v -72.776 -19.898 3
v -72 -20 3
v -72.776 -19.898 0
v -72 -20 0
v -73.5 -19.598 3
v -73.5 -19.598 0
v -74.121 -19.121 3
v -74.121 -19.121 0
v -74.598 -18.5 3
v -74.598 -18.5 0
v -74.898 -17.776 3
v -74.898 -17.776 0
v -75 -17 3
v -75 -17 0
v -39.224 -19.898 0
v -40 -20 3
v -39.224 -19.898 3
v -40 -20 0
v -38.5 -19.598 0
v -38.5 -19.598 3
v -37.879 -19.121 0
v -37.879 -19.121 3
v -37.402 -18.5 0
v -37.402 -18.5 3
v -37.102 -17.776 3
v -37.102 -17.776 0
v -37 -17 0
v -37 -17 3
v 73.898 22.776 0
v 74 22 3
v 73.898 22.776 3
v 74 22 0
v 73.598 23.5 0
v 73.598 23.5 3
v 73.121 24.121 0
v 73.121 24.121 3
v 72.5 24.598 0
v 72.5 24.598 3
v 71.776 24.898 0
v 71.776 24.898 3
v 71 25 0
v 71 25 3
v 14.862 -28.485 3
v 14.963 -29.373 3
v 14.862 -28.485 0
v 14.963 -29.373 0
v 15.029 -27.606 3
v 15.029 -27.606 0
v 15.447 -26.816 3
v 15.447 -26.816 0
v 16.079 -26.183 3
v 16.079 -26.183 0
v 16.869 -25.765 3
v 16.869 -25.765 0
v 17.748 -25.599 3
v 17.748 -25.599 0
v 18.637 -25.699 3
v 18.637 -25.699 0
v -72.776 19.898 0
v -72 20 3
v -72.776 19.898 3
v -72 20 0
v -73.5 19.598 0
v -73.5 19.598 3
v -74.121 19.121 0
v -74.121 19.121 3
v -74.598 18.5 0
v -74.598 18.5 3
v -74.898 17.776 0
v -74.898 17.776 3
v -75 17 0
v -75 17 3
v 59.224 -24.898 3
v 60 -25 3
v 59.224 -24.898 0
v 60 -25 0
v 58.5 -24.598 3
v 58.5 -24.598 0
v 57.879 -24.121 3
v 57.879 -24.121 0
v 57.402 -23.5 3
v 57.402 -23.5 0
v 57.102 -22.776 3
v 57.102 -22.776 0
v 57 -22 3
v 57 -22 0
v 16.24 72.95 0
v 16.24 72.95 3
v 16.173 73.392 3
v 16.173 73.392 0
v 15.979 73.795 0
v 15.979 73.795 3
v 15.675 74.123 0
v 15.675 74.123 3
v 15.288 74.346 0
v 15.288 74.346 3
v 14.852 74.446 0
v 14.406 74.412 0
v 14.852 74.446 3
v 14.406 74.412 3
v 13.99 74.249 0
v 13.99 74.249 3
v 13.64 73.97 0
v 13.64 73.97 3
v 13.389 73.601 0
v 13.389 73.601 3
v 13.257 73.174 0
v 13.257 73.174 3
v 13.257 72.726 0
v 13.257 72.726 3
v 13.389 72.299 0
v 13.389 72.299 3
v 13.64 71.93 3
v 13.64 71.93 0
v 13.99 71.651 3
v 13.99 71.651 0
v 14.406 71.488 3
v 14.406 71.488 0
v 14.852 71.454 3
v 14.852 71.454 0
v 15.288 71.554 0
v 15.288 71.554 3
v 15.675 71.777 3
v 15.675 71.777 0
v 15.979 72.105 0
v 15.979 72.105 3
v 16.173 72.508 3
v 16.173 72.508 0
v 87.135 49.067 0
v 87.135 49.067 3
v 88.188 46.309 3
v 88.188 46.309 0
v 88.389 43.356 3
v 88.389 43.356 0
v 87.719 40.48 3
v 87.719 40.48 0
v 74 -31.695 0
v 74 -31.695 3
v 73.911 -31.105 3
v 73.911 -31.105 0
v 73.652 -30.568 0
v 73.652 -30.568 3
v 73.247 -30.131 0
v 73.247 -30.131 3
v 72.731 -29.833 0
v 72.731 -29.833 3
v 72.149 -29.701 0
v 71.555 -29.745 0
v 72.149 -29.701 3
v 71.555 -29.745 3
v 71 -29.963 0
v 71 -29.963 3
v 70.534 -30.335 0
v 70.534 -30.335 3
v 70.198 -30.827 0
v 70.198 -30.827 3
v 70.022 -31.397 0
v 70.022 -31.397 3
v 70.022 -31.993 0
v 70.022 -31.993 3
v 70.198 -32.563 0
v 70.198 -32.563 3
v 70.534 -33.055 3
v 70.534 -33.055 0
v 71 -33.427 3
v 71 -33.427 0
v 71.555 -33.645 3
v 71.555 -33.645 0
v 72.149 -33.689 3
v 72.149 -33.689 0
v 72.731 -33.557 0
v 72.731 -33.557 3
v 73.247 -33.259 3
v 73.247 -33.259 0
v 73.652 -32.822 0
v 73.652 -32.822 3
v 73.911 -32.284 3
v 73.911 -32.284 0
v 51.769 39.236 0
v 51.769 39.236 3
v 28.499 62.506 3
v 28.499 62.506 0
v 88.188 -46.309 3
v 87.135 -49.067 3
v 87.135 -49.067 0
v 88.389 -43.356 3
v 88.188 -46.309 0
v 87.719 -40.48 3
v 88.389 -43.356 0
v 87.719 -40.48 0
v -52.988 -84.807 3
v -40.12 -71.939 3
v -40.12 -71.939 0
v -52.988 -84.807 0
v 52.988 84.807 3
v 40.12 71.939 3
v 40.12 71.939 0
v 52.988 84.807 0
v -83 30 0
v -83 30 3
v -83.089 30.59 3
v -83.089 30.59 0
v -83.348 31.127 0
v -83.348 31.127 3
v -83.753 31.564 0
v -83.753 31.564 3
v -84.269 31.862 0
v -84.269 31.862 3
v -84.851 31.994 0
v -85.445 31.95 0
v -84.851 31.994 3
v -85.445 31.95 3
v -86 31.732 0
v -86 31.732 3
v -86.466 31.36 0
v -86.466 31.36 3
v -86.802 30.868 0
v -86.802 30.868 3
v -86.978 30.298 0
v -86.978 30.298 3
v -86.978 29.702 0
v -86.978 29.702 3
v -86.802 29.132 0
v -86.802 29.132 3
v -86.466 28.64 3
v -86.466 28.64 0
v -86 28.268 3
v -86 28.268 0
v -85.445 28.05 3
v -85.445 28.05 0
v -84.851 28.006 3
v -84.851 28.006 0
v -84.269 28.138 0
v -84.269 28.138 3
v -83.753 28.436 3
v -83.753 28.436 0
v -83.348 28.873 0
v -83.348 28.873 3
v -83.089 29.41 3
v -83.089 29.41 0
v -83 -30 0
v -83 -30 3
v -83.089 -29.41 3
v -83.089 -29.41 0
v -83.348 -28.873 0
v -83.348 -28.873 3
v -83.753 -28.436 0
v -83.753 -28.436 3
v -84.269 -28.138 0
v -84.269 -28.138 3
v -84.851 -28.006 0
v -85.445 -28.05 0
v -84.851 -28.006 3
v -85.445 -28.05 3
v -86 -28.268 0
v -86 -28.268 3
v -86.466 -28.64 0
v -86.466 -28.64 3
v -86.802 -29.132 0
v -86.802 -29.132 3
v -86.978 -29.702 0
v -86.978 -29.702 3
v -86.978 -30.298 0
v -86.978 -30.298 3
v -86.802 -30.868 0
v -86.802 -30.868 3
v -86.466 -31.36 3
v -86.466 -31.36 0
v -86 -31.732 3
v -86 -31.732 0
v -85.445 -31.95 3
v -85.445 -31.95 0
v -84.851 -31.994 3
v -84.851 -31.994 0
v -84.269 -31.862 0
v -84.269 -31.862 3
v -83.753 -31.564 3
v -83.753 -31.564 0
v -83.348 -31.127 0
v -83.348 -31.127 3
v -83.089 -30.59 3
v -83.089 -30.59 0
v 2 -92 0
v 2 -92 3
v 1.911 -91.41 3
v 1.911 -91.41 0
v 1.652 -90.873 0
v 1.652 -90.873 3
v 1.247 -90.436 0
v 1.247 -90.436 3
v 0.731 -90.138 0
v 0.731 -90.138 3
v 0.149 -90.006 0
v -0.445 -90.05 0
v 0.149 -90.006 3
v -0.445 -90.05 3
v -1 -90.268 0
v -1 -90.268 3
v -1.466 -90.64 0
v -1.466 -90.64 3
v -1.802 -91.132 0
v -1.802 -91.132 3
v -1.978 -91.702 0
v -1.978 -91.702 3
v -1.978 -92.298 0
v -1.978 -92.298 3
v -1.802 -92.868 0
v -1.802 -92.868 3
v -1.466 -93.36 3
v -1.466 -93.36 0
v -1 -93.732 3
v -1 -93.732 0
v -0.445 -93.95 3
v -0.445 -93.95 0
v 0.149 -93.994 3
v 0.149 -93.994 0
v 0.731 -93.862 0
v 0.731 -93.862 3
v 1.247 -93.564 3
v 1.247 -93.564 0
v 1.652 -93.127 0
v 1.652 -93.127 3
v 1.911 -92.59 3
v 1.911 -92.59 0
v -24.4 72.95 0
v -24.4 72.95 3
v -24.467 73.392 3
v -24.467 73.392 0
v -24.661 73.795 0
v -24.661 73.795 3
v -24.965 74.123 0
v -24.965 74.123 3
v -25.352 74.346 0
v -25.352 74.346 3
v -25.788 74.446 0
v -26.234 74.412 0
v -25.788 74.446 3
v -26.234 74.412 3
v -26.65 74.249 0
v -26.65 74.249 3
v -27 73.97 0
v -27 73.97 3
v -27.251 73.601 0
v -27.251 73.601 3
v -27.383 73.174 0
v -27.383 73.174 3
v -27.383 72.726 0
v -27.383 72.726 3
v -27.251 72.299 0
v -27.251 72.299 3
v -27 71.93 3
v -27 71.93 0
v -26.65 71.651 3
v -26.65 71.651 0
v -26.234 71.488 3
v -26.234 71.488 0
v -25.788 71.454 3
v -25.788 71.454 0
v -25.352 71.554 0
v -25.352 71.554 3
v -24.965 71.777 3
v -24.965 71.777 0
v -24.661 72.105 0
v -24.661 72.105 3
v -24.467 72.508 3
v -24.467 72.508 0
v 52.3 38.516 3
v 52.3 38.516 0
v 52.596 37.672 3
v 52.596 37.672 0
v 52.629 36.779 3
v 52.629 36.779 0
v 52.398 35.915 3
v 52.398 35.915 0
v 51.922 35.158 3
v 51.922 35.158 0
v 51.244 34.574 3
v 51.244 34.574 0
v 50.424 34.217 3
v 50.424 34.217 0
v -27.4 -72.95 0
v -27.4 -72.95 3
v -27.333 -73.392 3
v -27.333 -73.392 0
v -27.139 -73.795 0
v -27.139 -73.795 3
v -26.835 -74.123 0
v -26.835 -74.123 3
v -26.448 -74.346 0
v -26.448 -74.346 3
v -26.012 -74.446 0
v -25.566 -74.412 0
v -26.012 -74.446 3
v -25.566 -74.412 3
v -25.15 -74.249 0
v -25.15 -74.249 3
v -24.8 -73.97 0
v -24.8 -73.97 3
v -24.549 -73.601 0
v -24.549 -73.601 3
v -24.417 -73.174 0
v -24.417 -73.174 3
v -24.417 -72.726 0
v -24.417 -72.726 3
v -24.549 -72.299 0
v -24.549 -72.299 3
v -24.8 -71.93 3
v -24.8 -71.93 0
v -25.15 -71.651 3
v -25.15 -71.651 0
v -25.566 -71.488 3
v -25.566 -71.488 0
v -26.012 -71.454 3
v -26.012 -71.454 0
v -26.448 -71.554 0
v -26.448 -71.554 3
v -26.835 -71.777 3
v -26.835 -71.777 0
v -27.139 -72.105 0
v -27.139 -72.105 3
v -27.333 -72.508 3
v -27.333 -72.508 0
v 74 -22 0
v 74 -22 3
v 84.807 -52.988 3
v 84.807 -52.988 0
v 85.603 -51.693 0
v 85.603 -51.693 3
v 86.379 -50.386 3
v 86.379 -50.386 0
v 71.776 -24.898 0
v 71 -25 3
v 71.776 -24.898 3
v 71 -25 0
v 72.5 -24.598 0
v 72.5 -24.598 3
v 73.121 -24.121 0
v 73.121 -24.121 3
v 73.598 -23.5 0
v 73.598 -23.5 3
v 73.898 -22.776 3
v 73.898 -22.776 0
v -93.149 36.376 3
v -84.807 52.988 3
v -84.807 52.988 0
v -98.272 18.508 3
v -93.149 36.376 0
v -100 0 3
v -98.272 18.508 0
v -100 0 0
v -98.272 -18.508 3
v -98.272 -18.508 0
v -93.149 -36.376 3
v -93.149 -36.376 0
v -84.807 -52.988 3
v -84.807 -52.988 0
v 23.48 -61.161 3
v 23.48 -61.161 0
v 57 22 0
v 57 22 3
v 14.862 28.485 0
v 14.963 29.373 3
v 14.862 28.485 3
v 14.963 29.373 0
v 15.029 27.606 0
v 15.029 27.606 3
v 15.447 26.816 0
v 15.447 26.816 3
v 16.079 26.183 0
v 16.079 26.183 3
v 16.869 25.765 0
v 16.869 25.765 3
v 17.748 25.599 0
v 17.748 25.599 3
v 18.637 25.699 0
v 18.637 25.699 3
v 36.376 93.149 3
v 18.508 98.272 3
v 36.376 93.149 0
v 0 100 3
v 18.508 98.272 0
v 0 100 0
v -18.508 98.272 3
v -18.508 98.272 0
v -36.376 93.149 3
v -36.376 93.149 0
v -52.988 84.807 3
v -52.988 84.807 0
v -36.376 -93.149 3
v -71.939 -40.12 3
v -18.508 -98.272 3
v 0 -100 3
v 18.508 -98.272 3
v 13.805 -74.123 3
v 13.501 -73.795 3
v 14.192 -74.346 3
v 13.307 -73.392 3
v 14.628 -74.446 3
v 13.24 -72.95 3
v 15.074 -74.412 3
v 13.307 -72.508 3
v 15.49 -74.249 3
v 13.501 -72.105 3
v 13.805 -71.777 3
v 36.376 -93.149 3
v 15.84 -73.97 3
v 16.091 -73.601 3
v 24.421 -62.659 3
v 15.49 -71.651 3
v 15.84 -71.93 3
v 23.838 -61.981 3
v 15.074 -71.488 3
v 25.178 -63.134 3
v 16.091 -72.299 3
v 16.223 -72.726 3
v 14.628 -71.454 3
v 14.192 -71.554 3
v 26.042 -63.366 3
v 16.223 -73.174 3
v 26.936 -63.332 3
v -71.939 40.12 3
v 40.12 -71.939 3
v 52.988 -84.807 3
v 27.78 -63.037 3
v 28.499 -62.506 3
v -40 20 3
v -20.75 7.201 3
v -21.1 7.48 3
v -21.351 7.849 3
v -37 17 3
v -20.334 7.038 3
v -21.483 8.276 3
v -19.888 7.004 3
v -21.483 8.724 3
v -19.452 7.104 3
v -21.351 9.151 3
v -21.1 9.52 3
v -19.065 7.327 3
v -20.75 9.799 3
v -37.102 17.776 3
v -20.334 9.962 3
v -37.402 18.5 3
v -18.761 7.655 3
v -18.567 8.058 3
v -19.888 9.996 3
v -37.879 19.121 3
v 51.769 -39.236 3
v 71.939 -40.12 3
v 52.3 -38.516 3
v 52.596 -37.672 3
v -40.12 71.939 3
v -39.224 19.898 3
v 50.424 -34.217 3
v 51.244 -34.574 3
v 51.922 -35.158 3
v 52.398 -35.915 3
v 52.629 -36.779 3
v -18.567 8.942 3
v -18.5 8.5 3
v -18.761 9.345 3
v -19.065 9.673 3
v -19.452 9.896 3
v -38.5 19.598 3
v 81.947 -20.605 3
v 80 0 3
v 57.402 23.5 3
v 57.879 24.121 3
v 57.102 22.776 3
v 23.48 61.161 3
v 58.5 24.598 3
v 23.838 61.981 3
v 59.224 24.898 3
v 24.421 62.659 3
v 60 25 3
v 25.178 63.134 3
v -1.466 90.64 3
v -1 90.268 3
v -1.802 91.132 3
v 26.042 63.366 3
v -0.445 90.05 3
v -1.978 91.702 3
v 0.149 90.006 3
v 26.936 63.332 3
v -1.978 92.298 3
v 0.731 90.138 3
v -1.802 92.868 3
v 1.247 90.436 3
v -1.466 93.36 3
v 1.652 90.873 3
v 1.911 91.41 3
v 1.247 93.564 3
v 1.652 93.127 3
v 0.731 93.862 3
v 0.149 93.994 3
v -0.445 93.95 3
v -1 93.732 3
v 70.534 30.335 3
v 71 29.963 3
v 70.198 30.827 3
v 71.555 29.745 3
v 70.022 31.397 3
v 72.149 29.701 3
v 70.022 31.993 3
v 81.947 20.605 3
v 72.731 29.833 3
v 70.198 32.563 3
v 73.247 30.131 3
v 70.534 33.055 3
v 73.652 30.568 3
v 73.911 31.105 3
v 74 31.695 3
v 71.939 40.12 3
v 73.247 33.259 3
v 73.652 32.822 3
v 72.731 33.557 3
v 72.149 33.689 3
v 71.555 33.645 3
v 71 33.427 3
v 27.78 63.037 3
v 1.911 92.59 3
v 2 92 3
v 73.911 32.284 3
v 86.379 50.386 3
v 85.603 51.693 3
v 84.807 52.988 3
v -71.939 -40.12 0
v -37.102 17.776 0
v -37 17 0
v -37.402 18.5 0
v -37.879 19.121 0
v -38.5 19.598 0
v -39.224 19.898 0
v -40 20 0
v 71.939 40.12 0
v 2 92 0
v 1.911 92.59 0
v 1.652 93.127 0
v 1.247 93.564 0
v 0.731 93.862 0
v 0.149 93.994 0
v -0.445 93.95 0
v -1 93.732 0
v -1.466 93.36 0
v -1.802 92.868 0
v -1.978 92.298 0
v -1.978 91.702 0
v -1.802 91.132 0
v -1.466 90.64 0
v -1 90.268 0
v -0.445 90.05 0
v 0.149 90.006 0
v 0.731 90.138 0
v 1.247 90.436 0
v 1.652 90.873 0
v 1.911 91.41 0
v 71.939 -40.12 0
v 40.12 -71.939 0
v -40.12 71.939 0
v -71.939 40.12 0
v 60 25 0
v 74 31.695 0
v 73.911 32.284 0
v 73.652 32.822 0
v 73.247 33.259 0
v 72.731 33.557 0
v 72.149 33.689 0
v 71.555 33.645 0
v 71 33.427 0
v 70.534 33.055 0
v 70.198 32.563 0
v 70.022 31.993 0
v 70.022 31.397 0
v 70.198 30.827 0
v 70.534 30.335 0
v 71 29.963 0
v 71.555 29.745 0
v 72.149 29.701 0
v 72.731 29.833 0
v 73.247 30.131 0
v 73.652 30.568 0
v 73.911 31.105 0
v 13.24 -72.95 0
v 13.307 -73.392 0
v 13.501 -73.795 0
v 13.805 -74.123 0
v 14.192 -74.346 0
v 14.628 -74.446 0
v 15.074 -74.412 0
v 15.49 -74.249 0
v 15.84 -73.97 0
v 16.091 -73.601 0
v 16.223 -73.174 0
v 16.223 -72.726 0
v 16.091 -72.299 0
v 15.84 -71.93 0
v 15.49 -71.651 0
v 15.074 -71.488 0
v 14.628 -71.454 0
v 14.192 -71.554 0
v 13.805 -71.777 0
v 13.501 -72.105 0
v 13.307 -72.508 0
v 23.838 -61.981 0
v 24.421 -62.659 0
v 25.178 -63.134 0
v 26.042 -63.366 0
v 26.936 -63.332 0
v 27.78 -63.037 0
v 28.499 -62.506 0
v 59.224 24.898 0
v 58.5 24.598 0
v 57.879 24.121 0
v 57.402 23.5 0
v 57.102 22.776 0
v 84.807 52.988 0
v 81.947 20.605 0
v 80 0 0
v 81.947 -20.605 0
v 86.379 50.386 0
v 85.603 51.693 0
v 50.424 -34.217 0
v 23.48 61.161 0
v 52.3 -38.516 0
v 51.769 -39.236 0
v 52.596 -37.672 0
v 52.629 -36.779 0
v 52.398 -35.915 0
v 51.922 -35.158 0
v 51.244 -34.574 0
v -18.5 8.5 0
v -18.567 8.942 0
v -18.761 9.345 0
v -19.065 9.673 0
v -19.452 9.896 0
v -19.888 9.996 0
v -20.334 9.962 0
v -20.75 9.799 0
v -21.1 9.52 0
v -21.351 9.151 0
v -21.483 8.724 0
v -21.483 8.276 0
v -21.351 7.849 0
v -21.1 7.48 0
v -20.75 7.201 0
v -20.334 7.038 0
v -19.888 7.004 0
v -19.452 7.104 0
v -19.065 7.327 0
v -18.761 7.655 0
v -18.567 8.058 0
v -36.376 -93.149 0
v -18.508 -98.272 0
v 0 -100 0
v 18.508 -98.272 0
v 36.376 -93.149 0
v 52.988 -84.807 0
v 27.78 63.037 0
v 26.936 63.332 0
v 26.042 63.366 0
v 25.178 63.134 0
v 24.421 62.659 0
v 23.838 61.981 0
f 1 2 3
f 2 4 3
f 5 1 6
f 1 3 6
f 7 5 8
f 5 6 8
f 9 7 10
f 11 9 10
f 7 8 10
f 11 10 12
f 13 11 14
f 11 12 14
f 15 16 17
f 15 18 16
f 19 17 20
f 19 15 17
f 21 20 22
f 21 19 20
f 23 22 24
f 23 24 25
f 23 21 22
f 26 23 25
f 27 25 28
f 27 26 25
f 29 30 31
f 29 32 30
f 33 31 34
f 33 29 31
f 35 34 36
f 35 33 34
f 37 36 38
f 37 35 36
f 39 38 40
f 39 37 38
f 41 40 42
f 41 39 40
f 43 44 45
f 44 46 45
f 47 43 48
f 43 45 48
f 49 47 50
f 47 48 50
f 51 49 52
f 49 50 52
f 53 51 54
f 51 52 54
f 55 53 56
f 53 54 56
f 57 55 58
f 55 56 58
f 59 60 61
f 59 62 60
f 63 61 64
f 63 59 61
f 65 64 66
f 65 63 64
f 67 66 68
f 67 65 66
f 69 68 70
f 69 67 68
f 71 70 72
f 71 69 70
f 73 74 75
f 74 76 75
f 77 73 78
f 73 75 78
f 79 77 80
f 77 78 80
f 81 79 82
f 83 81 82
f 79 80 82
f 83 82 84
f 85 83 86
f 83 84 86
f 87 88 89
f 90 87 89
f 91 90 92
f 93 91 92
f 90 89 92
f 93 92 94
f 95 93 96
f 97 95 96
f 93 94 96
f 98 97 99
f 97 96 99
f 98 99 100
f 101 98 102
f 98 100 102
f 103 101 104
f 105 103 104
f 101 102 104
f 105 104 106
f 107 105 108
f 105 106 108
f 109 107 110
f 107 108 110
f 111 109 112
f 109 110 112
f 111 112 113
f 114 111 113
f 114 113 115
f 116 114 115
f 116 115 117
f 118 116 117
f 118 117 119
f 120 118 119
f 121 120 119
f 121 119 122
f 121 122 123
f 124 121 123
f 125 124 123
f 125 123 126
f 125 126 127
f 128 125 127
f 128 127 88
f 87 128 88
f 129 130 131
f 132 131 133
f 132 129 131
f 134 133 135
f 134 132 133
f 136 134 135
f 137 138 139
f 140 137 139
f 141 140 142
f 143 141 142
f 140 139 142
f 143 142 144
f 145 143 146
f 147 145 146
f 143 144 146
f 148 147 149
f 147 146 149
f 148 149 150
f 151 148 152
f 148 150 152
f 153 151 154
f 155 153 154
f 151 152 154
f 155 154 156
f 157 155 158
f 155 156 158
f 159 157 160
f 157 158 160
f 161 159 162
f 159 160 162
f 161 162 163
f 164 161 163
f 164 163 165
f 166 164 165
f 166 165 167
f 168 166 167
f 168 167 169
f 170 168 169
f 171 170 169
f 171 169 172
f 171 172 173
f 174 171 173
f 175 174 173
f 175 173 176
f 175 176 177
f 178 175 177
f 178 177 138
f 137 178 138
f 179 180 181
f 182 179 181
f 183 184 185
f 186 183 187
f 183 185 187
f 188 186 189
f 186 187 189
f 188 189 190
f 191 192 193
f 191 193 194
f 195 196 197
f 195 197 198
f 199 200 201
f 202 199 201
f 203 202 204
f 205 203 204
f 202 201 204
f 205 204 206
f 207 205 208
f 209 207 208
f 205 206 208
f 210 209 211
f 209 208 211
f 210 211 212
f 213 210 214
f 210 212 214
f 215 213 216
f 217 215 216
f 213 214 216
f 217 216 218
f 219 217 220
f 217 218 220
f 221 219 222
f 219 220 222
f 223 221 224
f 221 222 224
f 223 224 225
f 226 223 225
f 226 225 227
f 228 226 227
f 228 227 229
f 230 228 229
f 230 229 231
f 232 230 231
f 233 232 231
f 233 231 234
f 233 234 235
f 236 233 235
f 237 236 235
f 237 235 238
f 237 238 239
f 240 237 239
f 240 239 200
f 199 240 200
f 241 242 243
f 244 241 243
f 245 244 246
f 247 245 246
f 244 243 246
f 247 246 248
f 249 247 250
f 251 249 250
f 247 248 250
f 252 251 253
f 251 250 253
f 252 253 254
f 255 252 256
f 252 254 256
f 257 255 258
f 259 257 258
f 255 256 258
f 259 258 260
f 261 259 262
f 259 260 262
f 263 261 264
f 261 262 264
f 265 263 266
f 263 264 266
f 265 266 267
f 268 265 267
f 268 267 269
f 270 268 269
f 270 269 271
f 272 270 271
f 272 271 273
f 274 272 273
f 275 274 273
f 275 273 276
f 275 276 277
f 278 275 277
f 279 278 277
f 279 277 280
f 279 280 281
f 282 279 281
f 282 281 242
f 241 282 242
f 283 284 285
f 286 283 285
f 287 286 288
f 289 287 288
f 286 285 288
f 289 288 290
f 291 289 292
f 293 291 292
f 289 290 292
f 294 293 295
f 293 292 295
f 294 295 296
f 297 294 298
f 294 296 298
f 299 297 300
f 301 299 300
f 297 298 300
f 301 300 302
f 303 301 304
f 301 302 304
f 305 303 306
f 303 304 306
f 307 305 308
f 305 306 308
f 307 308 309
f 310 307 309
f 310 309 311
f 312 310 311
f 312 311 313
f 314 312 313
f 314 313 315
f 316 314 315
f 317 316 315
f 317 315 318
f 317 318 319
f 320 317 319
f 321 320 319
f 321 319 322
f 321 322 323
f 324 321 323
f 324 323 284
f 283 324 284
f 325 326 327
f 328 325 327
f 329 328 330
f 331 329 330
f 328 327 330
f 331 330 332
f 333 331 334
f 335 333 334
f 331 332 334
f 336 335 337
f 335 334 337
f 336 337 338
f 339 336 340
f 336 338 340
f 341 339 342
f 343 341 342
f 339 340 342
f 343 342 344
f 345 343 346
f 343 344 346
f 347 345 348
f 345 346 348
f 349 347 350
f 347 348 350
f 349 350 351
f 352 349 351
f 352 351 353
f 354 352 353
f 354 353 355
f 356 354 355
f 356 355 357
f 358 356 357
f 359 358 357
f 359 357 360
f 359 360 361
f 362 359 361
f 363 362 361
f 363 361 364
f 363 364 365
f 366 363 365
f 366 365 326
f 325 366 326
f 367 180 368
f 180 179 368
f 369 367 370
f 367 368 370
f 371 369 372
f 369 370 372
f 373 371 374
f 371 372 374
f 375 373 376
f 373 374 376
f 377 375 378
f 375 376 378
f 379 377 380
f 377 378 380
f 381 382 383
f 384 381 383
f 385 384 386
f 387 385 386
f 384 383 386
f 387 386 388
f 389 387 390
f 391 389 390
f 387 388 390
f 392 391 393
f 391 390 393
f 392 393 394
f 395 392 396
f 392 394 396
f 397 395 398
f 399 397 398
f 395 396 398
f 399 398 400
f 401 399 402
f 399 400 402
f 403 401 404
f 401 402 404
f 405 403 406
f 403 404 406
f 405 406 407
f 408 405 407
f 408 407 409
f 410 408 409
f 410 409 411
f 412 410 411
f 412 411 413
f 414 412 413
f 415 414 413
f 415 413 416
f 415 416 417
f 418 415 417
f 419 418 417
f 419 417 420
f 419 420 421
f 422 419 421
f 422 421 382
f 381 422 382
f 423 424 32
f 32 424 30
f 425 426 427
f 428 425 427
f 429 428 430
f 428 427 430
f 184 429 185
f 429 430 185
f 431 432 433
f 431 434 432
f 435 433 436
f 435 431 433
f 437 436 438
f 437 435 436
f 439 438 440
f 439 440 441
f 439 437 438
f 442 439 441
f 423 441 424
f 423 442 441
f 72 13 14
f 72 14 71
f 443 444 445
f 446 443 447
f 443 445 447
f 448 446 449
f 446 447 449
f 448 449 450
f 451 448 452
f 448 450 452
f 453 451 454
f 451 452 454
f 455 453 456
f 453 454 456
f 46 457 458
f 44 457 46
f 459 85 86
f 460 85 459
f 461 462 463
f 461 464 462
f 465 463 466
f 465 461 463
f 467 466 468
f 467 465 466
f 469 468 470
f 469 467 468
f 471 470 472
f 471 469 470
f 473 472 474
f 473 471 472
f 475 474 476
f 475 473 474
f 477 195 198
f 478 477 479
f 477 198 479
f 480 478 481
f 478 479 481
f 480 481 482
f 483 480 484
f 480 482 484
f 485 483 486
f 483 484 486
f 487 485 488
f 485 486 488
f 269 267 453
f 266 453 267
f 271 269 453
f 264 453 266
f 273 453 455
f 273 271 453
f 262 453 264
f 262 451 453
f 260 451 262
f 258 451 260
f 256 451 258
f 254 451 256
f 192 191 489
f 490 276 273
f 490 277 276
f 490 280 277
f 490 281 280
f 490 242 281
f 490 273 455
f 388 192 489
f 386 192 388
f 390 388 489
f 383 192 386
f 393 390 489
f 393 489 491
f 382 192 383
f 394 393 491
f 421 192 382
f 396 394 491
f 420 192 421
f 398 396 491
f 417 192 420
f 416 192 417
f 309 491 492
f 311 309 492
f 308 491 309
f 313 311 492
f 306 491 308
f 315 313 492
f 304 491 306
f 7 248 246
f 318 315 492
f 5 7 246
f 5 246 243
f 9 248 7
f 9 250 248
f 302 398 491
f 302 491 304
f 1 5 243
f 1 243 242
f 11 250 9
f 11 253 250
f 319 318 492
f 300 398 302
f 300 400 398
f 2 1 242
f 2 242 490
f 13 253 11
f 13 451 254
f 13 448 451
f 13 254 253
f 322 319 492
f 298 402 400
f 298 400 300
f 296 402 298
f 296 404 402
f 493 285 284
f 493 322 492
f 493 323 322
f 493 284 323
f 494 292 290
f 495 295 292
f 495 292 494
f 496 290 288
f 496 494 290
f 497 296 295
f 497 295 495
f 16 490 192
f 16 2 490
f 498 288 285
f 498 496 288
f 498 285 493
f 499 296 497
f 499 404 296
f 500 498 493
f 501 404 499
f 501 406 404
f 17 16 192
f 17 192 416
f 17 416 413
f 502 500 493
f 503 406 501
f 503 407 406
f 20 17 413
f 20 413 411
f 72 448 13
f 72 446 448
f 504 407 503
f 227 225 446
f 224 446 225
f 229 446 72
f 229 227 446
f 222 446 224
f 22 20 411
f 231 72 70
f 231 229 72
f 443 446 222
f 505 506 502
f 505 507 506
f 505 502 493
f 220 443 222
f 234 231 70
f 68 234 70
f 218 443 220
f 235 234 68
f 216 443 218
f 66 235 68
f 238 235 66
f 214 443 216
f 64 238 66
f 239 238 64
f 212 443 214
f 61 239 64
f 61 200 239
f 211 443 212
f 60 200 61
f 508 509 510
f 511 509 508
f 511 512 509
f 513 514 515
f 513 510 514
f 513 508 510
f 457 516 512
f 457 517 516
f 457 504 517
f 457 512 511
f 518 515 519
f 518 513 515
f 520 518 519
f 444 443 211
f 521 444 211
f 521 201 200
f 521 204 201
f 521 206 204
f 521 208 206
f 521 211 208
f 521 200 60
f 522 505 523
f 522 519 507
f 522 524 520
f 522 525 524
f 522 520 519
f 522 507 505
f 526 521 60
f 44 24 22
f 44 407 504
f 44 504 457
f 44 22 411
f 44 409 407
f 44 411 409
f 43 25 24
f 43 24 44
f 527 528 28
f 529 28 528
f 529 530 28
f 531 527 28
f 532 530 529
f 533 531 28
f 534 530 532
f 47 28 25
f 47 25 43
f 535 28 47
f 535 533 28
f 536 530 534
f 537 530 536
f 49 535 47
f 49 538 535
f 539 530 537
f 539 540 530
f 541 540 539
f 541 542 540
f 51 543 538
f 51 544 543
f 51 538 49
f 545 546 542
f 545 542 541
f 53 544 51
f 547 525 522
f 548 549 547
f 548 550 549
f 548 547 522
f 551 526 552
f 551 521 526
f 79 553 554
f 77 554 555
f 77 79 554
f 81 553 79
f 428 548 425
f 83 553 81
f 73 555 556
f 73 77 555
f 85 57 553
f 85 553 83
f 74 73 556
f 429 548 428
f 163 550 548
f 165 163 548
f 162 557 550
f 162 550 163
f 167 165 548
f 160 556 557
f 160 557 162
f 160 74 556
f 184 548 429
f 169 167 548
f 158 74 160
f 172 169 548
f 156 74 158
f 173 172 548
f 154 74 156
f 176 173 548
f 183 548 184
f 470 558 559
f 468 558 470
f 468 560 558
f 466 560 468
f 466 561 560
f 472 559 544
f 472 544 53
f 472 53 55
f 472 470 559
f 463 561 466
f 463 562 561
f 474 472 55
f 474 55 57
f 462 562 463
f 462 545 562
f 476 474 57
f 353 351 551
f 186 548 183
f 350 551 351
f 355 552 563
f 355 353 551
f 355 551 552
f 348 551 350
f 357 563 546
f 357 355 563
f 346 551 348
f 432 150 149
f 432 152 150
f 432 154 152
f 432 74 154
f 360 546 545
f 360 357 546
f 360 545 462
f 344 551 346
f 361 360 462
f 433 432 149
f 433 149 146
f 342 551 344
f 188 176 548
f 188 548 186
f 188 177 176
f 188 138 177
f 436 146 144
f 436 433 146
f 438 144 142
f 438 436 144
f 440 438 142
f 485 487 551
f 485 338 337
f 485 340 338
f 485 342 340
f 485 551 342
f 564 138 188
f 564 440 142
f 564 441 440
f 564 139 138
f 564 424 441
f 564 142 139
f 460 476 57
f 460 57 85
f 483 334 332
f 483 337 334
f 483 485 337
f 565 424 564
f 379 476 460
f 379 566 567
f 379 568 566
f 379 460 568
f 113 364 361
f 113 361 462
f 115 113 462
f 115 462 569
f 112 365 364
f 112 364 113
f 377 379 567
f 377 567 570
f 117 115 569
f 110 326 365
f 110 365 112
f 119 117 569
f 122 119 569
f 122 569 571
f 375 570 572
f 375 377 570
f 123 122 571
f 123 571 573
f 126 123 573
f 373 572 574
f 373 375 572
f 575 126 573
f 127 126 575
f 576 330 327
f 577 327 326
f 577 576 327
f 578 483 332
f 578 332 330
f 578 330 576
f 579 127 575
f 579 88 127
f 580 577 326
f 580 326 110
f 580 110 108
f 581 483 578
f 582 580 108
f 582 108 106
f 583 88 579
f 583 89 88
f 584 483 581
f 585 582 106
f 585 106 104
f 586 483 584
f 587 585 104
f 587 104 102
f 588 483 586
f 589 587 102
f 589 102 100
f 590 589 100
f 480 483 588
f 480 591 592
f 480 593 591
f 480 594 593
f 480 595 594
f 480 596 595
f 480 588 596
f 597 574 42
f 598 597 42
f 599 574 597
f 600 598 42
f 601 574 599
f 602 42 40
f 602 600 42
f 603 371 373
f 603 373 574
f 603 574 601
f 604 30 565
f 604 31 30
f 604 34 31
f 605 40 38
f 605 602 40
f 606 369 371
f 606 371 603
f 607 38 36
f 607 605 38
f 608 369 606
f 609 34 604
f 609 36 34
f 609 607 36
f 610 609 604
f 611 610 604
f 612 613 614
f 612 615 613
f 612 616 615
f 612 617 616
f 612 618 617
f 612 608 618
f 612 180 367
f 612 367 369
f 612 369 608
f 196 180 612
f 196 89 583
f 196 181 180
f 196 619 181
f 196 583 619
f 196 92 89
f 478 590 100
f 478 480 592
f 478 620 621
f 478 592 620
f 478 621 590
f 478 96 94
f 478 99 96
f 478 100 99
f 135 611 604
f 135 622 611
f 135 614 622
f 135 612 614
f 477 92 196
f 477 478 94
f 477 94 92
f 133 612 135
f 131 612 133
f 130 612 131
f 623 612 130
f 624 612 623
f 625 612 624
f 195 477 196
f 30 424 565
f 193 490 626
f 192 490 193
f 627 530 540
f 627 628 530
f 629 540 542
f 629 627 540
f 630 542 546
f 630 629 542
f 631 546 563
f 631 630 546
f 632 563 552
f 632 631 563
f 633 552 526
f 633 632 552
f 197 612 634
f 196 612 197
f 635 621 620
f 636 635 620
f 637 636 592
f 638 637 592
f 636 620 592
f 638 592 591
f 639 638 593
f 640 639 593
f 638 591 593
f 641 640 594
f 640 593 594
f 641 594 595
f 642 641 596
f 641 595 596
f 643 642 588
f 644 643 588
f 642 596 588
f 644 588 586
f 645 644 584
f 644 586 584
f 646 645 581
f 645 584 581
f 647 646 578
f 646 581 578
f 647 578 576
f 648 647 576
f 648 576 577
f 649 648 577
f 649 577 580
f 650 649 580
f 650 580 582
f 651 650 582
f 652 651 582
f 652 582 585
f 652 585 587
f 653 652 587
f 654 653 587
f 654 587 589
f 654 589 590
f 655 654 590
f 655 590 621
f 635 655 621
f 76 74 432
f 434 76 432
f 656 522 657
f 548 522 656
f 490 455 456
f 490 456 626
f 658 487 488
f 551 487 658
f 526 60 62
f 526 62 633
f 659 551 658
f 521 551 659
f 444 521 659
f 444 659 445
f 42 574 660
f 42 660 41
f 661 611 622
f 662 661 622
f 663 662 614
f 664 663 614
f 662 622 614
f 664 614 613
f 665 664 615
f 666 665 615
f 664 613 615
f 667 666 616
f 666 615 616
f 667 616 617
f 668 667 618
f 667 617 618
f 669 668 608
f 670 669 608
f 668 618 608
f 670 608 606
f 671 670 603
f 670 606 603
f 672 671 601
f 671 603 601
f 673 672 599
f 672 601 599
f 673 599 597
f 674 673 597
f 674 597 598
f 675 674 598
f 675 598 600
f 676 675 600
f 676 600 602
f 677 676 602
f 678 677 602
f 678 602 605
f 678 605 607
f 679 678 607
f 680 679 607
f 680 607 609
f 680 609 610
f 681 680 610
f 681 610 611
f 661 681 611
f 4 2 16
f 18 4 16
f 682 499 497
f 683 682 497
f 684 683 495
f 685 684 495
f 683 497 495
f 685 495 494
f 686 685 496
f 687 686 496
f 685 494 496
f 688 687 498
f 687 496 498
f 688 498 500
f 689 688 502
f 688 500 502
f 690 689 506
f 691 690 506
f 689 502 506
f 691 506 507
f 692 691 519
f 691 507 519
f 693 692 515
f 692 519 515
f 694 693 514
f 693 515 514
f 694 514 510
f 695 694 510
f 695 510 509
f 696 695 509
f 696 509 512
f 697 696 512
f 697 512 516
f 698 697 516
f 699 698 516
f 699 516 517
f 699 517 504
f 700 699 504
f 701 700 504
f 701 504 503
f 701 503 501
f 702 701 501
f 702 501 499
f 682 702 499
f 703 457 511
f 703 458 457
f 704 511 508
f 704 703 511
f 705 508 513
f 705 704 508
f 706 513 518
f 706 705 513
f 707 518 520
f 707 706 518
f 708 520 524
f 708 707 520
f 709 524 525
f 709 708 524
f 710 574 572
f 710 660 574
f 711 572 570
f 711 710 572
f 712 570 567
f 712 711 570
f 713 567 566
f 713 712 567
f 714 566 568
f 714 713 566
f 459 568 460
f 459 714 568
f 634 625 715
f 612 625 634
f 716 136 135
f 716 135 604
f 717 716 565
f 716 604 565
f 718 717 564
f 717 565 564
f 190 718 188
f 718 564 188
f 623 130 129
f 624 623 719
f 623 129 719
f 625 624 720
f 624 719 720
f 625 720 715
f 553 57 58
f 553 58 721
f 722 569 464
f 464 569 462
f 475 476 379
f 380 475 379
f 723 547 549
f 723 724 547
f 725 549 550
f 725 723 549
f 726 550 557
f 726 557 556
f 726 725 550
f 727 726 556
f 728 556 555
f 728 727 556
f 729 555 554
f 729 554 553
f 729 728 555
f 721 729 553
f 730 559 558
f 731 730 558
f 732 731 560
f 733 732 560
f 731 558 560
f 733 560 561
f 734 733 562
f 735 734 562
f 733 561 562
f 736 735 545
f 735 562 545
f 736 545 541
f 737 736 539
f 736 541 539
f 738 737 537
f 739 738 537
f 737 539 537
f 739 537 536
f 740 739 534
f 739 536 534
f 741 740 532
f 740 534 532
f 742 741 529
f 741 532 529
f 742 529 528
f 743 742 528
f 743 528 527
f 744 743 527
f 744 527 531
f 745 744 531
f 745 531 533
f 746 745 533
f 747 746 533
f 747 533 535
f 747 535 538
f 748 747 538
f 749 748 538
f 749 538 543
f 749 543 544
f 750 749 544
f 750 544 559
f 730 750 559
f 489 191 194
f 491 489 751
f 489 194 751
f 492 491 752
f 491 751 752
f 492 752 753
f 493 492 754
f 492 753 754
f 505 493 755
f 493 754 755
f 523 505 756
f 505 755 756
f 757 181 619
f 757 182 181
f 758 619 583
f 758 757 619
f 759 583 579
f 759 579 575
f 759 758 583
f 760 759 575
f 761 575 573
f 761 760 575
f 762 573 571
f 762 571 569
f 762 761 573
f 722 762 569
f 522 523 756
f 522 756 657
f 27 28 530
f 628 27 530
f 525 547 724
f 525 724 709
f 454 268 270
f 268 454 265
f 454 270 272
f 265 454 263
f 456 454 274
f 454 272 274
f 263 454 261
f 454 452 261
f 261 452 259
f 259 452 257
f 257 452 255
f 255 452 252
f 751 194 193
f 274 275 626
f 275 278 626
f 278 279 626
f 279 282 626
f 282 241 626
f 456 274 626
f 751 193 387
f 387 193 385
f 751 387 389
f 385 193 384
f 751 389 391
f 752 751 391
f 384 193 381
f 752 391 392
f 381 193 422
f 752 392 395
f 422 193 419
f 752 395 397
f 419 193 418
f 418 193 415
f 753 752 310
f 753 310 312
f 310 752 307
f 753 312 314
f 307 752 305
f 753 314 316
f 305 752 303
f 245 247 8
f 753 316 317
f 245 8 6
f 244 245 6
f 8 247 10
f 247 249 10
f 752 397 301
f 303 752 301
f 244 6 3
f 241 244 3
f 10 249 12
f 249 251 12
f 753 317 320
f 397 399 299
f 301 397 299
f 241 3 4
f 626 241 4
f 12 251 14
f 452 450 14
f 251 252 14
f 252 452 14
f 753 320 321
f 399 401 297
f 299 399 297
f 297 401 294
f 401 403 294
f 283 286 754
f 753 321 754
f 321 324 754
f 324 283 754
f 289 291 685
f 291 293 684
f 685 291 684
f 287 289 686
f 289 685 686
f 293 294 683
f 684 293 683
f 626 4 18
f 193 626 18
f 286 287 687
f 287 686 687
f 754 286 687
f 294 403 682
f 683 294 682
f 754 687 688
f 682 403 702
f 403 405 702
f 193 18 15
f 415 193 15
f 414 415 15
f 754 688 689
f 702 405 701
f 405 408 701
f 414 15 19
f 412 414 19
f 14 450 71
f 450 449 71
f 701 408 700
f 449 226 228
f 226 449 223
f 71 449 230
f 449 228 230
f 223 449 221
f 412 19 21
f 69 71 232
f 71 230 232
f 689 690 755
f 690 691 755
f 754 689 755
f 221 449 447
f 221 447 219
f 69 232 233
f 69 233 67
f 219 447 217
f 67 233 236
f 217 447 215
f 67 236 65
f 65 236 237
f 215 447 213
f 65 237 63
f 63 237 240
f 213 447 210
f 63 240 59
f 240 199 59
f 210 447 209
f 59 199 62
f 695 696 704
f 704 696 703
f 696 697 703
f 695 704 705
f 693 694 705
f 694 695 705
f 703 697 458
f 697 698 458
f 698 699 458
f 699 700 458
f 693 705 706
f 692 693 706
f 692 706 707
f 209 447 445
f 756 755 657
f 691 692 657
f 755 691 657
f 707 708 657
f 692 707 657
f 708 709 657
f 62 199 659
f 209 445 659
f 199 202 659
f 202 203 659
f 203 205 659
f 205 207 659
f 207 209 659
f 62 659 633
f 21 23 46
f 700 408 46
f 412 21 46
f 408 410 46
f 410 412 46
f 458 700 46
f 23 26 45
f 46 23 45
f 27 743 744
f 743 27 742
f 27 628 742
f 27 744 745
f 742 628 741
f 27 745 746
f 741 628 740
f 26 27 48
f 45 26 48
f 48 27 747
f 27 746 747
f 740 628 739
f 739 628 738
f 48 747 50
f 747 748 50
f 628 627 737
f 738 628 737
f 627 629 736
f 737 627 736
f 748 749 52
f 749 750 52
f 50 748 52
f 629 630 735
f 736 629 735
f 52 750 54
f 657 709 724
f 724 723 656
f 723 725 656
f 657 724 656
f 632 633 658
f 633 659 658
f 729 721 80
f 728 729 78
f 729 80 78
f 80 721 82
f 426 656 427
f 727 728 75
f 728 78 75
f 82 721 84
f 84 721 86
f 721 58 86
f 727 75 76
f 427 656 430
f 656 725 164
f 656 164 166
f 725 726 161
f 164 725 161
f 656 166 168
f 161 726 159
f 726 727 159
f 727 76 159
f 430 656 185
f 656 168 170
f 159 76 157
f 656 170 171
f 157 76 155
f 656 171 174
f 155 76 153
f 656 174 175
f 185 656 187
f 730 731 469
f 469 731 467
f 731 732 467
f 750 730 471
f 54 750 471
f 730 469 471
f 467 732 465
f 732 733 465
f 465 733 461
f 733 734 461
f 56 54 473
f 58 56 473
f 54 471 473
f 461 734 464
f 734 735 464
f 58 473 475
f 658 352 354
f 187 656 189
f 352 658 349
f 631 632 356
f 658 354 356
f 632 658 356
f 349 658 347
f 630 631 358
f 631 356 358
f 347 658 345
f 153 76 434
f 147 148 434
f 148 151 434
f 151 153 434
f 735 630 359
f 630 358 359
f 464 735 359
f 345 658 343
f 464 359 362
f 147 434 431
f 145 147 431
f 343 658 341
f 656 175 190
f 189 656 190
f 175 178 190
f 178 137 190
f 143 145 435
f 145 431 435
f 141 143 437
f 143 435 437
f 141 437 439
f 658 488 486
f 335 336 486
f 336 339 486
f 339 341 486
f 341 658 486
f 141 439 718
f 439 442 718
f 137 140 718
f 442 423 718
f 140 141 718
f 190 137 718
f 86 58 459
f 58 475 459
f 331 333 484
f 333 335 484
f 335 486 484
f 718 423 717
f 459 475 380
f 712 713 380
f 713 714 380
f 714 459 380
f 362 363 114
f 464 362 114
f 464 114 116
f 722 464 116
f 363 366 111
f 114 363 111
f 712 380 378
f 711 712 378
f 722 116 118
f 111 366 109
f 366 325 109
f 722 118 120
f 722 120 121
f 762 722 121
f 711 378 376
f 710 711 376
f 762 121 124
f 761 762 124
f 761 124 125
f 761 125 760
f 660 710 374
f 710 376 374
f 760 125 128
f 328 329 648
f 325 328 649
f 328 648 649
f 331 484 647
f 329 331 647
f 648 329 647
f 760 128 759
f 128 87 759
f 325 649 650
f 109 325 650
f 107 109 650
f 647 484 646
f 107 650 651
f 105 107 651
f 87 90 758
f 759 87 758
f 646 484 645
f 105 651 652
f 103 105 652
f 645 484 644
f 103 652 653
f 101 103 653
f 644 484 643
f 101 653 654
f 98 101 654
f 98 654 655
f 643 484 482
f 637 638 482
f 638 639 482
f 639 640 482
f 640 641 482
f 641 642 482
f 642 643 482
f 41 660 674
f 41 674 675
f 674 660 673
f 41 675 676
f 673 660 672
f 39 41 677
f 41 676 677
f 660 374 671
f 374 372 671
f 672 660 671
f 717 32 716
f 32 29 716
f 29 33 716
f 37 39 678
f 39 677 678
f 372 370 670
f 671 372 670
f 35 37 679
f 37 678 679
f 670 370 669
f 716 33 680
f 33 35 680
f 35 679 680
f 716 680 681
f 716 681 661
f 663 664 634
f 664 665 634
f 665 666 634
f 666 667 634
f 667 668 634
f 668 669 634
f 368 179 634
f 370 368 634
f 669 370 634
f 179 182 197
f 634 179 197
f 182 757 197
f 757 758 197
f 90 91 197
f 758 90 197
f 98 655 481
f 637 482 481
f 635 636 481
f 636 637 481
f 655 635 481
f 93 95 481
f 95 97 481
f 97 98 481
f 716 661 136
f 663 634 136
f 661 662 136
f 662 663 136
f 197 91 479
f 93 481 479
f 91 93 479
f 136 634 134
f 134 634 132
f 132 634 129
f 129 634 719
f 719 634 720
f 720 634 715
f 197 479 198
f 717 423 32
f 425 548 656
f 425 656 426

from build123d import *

# Parameters (mm, degrees)
CROQUIS1_R              = 100
SALIENTE_EXTRUIR1_DEPTH = 3
CROQUIS3_R              = 110
CORTAR_EXTRUIR1_DEPTH   = 3
REDONDEO1_R             = 10
CORTAR_EXTRUIR3_DEPTH   = 10
CROQUIS10_R             = 1.5
CORTAR_EXTRUIR4_DEPTH   = 142.453172607
CROQUIS11_R             = 2
CROQUIS11_W             = 17
CROQUIS11_H             = 50
CROQUIS11_W_2           = 38
CROQUIS11_H_2           = 40
CORTAR_EXTRUIR5_DEPTH   = 10
REDONDEO2_R             = 3


with BuildPart() as part:
    # Croquis1 → Saliente-Extruir1 (new body)
    with BuildSketch(Plane.XY):
        Circle(CROQUIS1_R)
    extrude(amount=SALIENTE_EXTRUIR1_DEPTH)

    # Croquis3 → Cortar-Extruir1 (cut)
    with BuildSketch(Plane.XY.offset(3)):
        with Locations((190, 0)):
            Circle(CROQUIS3_R)
    extrude(amount=-CORTAR_EXTRUIR1_DEPTH, mode=Mode.SUBTRACT)

    # Redondeo1
    redondeo1_edges = [part.edges().sort_by_distance(p)[0] for p in [
        (89.473684211, -44.659375654, 1.5),
        (89.473684211, 44.659375654, 1.5),
    ]]
    fillet(redondeo1_edges, radius=REDONDEO1_R)

    # Croquis7 → Cortar-Extruir3 (cut)
    with BuildSketch(Plane.XY.offset(3)):
        Polygon((-71.939339828, -40.119534675), (-40.119534675, -71.939339828), (-57.797204204, -89.617009358), (-89.617009358, -57.797204204), align=None)
        Polygon((-40.119534675, 71.939339828), (-71.939339828, 40.119534675), (-89.617009358, 57.797204204), (-57.797204204, 89.617009358), align=None)
        Polygon((71.939339828, 40.119534675), (40.119534675, 71.939339828), (57.797204204, 89.617009358), (89.617009358, 57.797204204), align=None)
        Polygon((40.119534675, -71.939339828), (71.939339828, -40.119534675), (89.617009358, -57.797204204), (57.797204204, -89.617009358), align=None)
    extrude(amount=-CORTAR_EXTRUIR3_DEPTH, mode=Mode.SUBTRACT)

    # Croquis10 → Cortar-Extruir4 (cut, through all)
    with BuildSketch(Plane.XY.offset(3)):
        with Locations((-20, 8.5)):
            Circle(CROQUIS10_R)
        with Locations((14.74, 72.95)):
            Circle(CROQUIS10_R)
        with Locations((-25.9, 72.95)):
            Circle(CROQUIS10_R)
        with Locations(Location((14.74, -72.95, 0), (0, 0, 180))):
            Circle(CROQUIS10_R)
        with Locations(Location((-25.9, -72.95, 0), (0, 0, 180))):
            Circle(CROQUIS10_R)
    extrude(amount=-CORTAR_EXTRUIR4_DEPTH, mode=Mode.SUBTRACT)

    # Croquis11 → Cortar-Extruir5 (cut)
    with BuildSketch(Plane.XY.offset(3)):
        with Locations((0, 92)):
            Circle(CROQUIS11_R)
        with Locations((0, -92)):
            Circle(CROQUIS11_R)
        with Locations((72, 31.694913472)):
            Circle(CROQUIS11_R)
        with Locations((72, -31.694913472)):
            Circle(CROQUIS11_R)
        with Locations((-85, -30)):
            Circle(CROQUIS11_R)
        with Locations((-85, 30)):
            Circle(CROQUIS11_R)
        with Locations((65.5, 0)):
            Rectangle(CROQUIS11_W, CROQUIS11_H)
        Polygon((55.443488939, 35.561561695), (24.824867154, 66.18018348), (13.617673752, 24.354368293), align=None)
        Polygon((13.617673752, -24.354368293), (55.443488939, -35.561561695), (24.824867154, -66.18018348), align=None)
        with Locations((-56, 0)):
            Rectangle(CROQUIS11_W_2, CROQUIS11_H_2)
    extrude(amount=-CORTAR_EXTRUIR5_DEPTH, mode=Mode.SUBTRACT)

    # Redondeo2
    redondeo2_edges = [part.edges().sort_by_distance(p)[0] for p in [
        (74, 25, 1.5),
        (74, -25, 1.5),
        (57, -25, 1.5),
        (57, 25, 1.5),
        (55.443488939, 35.561561695, 1.5),
        (13.617673752, 24.354368293, 1.5),
        (24.824867154, 66.18018348, 1.5),
        (24.824867154, -66.18018348, 1.5),
        (13.617673752, -24.354368293, 1.5),
        (55.443488939, -35.561561695, 1.5),
        (-37, 20, 1.5),
        (-37, -20, 1.5),
        (-75, -20, 1.5),
        (-75, 20, 1.5),
    ]]
    fillet(redondeo2_edges, radius=REDONDEO2_R)


solid = part.part
